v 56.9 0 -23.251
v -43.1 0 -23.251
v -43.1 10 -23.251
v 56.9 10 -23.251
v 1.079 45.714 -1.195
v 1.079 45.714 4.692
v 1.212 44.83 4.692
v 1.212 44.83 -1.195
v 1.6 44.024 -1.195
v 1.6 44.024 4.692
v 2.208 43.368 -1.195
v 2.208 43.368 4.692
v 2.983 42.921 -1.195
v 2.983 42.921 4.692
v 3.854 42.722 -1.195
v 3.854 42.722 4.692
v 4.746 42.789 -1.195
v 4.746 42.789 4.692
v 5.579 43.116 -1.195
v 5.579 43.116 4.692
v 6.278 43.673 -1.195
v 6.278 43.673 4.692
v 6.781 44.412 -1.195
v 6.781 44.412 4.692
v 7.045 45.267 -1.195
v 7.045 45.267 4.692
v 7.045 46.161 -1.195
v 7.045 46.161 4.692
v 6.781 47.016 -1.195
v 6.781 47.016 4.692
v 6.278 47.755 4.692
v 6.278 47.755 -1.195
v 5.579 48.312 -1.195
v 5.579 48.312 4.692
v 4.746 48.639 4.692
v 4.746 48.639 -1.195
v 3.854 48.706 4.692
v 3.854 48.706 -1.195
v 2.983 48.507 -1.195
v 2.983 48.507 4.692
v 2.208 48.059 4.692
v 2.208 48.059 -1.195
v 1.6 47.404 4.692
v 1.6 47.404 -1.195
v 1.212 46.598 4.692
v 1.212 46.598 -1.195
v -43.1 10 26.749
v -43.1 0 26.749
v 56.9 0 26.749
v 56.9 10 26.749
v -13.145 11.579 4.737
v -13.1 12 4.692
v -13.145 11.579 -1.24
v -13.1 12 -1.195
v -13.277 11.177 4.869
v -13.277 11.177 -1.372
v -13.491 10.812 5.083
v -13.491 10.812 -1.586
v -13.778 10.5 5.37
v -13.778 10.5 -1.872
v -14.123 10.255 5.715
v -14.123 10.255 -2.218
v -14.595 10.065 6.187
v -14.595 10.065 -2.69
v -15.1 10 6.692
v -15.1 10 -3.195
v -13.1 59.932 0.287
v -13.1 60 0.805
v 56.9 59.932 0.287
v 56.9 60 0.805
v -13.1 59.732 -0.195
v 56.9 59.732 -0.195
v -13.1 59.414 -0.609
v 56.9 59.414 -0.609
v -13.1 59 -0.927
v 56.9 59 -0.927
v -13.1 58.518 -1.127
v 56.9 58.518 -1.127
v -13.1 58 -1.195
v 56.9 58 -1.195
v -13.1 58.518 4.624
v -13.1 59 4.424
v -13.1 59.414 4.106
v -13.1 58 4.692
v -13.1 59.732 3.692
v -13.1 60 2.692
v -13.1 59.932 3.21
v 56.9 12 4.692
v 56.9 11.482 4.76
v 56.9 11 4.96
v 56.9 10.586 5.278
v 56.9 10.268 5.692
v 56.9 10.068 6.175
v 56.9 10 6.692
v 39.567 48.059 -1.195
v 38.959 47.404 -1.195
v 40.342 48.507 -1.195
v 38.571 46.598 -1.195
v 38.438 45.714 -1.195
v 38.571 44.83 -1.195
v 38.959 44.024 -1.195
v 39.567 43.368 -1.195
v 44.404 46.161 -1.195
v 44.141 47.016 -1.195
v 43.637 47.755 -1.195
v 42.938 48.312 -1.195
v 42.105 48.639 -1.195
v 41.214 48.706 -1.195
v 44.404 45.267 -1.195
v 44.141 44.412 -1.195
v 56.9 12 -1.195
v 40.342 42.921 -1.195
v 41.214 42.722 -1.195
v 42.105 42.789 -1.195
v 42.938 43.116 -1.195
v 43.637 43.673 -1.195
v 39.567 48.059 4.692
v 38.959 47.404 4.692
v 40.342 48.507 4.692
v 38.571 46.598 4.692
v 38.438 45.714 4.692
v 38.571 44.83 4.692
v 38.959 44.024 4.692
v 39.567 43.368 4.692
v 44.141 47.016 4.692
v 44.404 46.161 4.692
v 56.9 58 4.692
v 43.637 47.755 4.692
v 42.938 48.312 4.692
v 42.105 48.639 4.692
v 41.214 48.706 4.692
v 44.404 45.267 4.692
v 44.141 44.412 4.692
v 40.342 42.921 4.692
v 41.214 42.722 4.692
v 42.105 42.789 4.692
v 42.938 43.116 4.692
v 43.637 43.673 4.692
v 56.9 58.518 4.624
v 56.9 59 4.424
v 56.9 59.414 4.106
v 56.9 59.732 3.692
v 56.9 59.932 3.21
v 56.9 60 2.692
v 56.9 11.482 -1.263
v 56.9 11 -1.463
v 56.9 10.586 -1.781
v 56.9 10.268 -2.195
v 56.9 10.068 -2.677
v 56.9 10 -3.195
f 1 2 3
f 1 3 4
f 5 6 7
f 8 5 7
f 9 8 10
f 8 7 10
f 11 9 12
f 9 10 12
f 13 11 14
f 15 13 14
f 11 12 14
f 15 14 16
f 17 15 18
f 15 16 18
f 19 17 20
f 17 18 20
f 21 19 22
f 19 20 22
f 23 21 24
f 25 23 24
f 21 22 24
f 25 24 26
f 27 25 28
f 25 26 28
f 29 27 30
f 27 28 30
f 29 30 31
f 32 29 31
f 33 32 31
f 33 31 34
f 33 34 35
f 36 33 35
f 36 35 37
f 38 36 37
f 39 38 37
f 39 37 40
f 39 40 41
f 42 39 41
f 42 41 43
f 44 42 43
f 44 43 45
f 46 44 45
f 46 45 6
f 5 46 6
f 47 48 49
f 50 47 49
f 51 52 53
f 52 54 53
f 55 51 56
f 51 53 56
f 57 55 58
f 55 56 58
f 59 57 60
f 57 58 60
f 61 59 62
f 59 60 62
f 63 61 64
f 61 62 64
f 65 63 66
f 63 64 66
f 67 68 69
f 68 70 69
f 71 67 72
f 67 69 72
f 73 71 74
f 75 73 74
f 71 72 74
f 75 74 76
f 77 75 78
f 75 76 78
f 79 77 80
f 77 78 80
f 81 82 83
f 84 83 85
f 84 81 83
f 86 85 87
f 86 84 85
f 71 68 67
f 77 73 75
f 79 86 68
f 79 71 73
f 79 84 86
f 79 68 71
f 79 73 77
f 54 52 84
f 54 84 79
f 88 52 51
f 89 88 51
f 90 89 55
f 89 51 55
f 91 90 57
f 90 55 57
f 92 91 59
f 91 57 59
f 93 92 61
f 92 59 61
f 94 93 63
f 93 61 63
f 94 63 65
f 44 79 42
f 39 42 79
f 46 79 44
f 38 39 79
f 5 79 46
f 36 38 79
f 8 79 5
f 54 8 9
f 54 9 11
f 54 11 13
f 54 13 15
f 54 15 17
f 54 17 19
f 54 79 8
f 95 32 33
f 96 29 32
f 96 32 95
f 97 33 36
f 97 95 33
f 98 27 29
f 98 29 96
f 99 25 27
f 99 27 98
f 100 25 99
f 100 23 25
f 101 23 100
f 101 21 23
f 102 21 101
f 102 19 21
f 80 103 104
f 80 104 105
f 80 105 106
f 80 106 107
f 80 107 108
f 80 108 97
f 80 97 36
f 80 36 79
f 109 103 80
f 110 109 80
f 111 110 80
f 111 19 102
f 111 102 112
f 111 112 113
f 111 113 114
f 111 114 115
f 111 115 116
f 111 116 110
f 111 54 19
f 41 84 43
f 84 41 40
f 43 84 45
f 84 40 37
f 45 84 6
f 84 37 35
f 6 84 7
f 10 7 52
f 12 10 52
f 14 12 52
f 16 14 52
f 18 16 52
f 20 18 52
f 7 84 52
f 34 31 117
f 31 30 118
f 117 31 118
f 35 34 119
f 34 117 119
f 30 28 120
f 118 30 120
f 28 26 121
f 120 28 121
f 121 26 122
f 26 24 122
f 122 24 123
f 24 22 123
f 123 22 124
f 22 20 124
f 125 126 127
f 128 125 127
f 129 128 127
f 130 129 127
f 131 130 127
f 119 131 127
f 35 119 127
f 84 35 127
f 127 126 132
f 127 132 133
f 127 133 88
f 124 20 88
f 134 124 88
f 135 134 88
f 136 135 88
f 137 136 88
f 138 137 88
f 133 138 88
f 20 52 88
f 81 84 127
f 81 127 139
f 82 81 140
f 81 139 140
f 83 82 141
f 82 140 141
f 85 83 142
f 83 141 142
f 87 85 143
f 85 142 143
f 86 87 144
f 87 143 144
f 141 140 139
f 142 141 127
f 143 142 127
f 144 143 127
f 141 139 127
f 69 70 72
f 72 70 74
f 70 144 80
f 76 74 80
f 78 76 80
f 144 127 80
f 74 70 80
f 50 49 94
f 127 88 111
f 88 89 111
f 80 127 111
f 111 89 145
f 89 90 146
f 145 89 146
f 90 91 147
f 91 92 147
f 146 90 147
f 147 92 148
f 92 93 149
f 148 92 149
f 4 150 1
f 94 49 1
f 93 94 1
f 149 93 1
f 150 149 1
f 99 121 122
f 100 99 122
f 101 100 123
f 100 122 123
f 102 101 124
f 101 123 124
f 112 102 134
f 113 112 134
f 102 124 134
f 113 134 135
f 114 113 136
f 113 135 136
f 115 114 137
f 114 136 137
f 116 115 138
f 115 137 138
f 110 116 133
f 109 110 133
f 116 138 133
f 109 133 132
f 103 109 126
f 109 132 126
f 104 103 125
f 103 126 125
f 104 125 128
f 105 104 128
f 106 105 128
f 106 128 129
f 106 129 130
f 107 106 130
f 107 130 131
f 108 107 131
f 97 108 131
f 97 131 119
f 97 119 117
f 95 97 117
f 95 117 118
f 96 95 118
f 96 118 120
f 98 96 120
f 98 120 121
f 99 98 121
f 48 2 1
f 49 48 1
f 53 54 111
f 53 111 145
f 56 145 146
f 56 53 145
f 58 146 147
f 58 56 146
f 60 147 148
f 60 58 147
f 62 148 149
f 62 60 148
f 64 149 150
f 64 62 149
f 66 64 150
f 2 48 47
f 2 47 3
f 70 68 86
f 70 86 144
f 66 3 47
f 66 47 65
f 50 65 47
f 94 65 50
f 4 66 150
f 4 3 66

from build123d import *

# Parameters (mm, degrees)
SKETCH1_W               = 100
SKETCH1_H               = 50
BOSS_EXTRUDE1_DEPTH     = 10
SKETCH2_W               = 70
SKETCH2_H               = 5.887144663
BOSS_EXTRUDE2_DEPTH     = 60
SKETCH3_R               = 3
CUT_EXTRUDE1_DEPTH      = 10
CUT_EXTRUDE1_DEPTH_BACK = 10
FILLET1_R               = 2
FILLET2_R               = 2
FILLET3_R               = 2
FILLET4_R               = 2
FILLET5_R               = 2


with BuildPart() as part:
    # Sketch1 → Boss-Extrude1 (new body)
    with BuildSketch(Plane(origin=(0, 0, 0), x_dir=(1, 0, 0), z_dir=(0, 1, 0))):
        with Locations((6.899810964, -1.748582231)):
            Rectangle(SKETCH1_W, SKETCH1_H)
    extrude(amount=BOSS_EXTRUDE1_DEPTH)

    # Sketch2 → Boss-Extrude2 (add)
    with BuildSketch(Plane(origin=(0, 0, 0), x_dir=(1, 0, 0), z_dir=(0, 1, 0))):
        with Locations((21.899810964, -1.748582231)):
            Rectangle(SKETCH2_W, SKETCH2_H)
    extrude(amount=BOSS_EXTRUDE2_DEPTH)

    # Sketch3 → Cut-Extrude1 (cut, two sides)
    with BuildSketch(Plane.XY.offset(4.692154562)) as cut_extrude1_sk:
        with Locations(Location((4.078525913, 45.713993349, 0), (0, 0, 180))):  # turned: the seam where the file's is
            Circle(SKETCH3_R)
        with Locations(Location((41.437726316, 45.713993349, 0), (0, 0, 180))):  # turned: the seam where the file's is
            Circle(SKETCH3_R)
    extrude(amount=CUT_EXTRUDE1_DEPTH, mode=Mode.SUBTRACT)
    extrude(cut_extrude1_sk.sketch, amount=-CUT_EXTRUDE1_DEPTH_BACK, mode=Mode.SUBTRACT)

    # Fillet1
    fillet1_edges = [part.edges().sort_by_distance(p)[0] for p in [
        (21.899810964, 60, 4.692154562),
    ]]
    fillet(fillet1_edges, radius=FILLET1_R)

    # Fillet2
    fillet2_edges = [part.edges().sort_by_distance(p)[0] for p in [
        (21.899810964, 60, -1.194990101),
    ]]
    fillet(fillet2_edges, radius=FILLET2_R)

    # Fillet3
    fillet3_edges = [part.edges().sort_by_distance(p)[0] for p in [
        (21.899810964, 10, -1.194990101),
    ]]
    fillet(fillet3_edges, radius=FILLET3_R)

    # Fillet4
    fillet4_edges = [part.edges().sort_by_distance(p)[0] for p in [
        (21.899810964, 10, 4.692154562),
    ]]
    fillet(fillet4_edges, radius=FILLET4_R)

    # Fillet5
    fillet5_edges = [part.edges().sort_by_distance(p)[0] for p in [
        (-13.100189036, 10, 1.748582231),
    ]]
    fillet(fillet5_edges, radius=FILLET5_R)


solid = part.part
